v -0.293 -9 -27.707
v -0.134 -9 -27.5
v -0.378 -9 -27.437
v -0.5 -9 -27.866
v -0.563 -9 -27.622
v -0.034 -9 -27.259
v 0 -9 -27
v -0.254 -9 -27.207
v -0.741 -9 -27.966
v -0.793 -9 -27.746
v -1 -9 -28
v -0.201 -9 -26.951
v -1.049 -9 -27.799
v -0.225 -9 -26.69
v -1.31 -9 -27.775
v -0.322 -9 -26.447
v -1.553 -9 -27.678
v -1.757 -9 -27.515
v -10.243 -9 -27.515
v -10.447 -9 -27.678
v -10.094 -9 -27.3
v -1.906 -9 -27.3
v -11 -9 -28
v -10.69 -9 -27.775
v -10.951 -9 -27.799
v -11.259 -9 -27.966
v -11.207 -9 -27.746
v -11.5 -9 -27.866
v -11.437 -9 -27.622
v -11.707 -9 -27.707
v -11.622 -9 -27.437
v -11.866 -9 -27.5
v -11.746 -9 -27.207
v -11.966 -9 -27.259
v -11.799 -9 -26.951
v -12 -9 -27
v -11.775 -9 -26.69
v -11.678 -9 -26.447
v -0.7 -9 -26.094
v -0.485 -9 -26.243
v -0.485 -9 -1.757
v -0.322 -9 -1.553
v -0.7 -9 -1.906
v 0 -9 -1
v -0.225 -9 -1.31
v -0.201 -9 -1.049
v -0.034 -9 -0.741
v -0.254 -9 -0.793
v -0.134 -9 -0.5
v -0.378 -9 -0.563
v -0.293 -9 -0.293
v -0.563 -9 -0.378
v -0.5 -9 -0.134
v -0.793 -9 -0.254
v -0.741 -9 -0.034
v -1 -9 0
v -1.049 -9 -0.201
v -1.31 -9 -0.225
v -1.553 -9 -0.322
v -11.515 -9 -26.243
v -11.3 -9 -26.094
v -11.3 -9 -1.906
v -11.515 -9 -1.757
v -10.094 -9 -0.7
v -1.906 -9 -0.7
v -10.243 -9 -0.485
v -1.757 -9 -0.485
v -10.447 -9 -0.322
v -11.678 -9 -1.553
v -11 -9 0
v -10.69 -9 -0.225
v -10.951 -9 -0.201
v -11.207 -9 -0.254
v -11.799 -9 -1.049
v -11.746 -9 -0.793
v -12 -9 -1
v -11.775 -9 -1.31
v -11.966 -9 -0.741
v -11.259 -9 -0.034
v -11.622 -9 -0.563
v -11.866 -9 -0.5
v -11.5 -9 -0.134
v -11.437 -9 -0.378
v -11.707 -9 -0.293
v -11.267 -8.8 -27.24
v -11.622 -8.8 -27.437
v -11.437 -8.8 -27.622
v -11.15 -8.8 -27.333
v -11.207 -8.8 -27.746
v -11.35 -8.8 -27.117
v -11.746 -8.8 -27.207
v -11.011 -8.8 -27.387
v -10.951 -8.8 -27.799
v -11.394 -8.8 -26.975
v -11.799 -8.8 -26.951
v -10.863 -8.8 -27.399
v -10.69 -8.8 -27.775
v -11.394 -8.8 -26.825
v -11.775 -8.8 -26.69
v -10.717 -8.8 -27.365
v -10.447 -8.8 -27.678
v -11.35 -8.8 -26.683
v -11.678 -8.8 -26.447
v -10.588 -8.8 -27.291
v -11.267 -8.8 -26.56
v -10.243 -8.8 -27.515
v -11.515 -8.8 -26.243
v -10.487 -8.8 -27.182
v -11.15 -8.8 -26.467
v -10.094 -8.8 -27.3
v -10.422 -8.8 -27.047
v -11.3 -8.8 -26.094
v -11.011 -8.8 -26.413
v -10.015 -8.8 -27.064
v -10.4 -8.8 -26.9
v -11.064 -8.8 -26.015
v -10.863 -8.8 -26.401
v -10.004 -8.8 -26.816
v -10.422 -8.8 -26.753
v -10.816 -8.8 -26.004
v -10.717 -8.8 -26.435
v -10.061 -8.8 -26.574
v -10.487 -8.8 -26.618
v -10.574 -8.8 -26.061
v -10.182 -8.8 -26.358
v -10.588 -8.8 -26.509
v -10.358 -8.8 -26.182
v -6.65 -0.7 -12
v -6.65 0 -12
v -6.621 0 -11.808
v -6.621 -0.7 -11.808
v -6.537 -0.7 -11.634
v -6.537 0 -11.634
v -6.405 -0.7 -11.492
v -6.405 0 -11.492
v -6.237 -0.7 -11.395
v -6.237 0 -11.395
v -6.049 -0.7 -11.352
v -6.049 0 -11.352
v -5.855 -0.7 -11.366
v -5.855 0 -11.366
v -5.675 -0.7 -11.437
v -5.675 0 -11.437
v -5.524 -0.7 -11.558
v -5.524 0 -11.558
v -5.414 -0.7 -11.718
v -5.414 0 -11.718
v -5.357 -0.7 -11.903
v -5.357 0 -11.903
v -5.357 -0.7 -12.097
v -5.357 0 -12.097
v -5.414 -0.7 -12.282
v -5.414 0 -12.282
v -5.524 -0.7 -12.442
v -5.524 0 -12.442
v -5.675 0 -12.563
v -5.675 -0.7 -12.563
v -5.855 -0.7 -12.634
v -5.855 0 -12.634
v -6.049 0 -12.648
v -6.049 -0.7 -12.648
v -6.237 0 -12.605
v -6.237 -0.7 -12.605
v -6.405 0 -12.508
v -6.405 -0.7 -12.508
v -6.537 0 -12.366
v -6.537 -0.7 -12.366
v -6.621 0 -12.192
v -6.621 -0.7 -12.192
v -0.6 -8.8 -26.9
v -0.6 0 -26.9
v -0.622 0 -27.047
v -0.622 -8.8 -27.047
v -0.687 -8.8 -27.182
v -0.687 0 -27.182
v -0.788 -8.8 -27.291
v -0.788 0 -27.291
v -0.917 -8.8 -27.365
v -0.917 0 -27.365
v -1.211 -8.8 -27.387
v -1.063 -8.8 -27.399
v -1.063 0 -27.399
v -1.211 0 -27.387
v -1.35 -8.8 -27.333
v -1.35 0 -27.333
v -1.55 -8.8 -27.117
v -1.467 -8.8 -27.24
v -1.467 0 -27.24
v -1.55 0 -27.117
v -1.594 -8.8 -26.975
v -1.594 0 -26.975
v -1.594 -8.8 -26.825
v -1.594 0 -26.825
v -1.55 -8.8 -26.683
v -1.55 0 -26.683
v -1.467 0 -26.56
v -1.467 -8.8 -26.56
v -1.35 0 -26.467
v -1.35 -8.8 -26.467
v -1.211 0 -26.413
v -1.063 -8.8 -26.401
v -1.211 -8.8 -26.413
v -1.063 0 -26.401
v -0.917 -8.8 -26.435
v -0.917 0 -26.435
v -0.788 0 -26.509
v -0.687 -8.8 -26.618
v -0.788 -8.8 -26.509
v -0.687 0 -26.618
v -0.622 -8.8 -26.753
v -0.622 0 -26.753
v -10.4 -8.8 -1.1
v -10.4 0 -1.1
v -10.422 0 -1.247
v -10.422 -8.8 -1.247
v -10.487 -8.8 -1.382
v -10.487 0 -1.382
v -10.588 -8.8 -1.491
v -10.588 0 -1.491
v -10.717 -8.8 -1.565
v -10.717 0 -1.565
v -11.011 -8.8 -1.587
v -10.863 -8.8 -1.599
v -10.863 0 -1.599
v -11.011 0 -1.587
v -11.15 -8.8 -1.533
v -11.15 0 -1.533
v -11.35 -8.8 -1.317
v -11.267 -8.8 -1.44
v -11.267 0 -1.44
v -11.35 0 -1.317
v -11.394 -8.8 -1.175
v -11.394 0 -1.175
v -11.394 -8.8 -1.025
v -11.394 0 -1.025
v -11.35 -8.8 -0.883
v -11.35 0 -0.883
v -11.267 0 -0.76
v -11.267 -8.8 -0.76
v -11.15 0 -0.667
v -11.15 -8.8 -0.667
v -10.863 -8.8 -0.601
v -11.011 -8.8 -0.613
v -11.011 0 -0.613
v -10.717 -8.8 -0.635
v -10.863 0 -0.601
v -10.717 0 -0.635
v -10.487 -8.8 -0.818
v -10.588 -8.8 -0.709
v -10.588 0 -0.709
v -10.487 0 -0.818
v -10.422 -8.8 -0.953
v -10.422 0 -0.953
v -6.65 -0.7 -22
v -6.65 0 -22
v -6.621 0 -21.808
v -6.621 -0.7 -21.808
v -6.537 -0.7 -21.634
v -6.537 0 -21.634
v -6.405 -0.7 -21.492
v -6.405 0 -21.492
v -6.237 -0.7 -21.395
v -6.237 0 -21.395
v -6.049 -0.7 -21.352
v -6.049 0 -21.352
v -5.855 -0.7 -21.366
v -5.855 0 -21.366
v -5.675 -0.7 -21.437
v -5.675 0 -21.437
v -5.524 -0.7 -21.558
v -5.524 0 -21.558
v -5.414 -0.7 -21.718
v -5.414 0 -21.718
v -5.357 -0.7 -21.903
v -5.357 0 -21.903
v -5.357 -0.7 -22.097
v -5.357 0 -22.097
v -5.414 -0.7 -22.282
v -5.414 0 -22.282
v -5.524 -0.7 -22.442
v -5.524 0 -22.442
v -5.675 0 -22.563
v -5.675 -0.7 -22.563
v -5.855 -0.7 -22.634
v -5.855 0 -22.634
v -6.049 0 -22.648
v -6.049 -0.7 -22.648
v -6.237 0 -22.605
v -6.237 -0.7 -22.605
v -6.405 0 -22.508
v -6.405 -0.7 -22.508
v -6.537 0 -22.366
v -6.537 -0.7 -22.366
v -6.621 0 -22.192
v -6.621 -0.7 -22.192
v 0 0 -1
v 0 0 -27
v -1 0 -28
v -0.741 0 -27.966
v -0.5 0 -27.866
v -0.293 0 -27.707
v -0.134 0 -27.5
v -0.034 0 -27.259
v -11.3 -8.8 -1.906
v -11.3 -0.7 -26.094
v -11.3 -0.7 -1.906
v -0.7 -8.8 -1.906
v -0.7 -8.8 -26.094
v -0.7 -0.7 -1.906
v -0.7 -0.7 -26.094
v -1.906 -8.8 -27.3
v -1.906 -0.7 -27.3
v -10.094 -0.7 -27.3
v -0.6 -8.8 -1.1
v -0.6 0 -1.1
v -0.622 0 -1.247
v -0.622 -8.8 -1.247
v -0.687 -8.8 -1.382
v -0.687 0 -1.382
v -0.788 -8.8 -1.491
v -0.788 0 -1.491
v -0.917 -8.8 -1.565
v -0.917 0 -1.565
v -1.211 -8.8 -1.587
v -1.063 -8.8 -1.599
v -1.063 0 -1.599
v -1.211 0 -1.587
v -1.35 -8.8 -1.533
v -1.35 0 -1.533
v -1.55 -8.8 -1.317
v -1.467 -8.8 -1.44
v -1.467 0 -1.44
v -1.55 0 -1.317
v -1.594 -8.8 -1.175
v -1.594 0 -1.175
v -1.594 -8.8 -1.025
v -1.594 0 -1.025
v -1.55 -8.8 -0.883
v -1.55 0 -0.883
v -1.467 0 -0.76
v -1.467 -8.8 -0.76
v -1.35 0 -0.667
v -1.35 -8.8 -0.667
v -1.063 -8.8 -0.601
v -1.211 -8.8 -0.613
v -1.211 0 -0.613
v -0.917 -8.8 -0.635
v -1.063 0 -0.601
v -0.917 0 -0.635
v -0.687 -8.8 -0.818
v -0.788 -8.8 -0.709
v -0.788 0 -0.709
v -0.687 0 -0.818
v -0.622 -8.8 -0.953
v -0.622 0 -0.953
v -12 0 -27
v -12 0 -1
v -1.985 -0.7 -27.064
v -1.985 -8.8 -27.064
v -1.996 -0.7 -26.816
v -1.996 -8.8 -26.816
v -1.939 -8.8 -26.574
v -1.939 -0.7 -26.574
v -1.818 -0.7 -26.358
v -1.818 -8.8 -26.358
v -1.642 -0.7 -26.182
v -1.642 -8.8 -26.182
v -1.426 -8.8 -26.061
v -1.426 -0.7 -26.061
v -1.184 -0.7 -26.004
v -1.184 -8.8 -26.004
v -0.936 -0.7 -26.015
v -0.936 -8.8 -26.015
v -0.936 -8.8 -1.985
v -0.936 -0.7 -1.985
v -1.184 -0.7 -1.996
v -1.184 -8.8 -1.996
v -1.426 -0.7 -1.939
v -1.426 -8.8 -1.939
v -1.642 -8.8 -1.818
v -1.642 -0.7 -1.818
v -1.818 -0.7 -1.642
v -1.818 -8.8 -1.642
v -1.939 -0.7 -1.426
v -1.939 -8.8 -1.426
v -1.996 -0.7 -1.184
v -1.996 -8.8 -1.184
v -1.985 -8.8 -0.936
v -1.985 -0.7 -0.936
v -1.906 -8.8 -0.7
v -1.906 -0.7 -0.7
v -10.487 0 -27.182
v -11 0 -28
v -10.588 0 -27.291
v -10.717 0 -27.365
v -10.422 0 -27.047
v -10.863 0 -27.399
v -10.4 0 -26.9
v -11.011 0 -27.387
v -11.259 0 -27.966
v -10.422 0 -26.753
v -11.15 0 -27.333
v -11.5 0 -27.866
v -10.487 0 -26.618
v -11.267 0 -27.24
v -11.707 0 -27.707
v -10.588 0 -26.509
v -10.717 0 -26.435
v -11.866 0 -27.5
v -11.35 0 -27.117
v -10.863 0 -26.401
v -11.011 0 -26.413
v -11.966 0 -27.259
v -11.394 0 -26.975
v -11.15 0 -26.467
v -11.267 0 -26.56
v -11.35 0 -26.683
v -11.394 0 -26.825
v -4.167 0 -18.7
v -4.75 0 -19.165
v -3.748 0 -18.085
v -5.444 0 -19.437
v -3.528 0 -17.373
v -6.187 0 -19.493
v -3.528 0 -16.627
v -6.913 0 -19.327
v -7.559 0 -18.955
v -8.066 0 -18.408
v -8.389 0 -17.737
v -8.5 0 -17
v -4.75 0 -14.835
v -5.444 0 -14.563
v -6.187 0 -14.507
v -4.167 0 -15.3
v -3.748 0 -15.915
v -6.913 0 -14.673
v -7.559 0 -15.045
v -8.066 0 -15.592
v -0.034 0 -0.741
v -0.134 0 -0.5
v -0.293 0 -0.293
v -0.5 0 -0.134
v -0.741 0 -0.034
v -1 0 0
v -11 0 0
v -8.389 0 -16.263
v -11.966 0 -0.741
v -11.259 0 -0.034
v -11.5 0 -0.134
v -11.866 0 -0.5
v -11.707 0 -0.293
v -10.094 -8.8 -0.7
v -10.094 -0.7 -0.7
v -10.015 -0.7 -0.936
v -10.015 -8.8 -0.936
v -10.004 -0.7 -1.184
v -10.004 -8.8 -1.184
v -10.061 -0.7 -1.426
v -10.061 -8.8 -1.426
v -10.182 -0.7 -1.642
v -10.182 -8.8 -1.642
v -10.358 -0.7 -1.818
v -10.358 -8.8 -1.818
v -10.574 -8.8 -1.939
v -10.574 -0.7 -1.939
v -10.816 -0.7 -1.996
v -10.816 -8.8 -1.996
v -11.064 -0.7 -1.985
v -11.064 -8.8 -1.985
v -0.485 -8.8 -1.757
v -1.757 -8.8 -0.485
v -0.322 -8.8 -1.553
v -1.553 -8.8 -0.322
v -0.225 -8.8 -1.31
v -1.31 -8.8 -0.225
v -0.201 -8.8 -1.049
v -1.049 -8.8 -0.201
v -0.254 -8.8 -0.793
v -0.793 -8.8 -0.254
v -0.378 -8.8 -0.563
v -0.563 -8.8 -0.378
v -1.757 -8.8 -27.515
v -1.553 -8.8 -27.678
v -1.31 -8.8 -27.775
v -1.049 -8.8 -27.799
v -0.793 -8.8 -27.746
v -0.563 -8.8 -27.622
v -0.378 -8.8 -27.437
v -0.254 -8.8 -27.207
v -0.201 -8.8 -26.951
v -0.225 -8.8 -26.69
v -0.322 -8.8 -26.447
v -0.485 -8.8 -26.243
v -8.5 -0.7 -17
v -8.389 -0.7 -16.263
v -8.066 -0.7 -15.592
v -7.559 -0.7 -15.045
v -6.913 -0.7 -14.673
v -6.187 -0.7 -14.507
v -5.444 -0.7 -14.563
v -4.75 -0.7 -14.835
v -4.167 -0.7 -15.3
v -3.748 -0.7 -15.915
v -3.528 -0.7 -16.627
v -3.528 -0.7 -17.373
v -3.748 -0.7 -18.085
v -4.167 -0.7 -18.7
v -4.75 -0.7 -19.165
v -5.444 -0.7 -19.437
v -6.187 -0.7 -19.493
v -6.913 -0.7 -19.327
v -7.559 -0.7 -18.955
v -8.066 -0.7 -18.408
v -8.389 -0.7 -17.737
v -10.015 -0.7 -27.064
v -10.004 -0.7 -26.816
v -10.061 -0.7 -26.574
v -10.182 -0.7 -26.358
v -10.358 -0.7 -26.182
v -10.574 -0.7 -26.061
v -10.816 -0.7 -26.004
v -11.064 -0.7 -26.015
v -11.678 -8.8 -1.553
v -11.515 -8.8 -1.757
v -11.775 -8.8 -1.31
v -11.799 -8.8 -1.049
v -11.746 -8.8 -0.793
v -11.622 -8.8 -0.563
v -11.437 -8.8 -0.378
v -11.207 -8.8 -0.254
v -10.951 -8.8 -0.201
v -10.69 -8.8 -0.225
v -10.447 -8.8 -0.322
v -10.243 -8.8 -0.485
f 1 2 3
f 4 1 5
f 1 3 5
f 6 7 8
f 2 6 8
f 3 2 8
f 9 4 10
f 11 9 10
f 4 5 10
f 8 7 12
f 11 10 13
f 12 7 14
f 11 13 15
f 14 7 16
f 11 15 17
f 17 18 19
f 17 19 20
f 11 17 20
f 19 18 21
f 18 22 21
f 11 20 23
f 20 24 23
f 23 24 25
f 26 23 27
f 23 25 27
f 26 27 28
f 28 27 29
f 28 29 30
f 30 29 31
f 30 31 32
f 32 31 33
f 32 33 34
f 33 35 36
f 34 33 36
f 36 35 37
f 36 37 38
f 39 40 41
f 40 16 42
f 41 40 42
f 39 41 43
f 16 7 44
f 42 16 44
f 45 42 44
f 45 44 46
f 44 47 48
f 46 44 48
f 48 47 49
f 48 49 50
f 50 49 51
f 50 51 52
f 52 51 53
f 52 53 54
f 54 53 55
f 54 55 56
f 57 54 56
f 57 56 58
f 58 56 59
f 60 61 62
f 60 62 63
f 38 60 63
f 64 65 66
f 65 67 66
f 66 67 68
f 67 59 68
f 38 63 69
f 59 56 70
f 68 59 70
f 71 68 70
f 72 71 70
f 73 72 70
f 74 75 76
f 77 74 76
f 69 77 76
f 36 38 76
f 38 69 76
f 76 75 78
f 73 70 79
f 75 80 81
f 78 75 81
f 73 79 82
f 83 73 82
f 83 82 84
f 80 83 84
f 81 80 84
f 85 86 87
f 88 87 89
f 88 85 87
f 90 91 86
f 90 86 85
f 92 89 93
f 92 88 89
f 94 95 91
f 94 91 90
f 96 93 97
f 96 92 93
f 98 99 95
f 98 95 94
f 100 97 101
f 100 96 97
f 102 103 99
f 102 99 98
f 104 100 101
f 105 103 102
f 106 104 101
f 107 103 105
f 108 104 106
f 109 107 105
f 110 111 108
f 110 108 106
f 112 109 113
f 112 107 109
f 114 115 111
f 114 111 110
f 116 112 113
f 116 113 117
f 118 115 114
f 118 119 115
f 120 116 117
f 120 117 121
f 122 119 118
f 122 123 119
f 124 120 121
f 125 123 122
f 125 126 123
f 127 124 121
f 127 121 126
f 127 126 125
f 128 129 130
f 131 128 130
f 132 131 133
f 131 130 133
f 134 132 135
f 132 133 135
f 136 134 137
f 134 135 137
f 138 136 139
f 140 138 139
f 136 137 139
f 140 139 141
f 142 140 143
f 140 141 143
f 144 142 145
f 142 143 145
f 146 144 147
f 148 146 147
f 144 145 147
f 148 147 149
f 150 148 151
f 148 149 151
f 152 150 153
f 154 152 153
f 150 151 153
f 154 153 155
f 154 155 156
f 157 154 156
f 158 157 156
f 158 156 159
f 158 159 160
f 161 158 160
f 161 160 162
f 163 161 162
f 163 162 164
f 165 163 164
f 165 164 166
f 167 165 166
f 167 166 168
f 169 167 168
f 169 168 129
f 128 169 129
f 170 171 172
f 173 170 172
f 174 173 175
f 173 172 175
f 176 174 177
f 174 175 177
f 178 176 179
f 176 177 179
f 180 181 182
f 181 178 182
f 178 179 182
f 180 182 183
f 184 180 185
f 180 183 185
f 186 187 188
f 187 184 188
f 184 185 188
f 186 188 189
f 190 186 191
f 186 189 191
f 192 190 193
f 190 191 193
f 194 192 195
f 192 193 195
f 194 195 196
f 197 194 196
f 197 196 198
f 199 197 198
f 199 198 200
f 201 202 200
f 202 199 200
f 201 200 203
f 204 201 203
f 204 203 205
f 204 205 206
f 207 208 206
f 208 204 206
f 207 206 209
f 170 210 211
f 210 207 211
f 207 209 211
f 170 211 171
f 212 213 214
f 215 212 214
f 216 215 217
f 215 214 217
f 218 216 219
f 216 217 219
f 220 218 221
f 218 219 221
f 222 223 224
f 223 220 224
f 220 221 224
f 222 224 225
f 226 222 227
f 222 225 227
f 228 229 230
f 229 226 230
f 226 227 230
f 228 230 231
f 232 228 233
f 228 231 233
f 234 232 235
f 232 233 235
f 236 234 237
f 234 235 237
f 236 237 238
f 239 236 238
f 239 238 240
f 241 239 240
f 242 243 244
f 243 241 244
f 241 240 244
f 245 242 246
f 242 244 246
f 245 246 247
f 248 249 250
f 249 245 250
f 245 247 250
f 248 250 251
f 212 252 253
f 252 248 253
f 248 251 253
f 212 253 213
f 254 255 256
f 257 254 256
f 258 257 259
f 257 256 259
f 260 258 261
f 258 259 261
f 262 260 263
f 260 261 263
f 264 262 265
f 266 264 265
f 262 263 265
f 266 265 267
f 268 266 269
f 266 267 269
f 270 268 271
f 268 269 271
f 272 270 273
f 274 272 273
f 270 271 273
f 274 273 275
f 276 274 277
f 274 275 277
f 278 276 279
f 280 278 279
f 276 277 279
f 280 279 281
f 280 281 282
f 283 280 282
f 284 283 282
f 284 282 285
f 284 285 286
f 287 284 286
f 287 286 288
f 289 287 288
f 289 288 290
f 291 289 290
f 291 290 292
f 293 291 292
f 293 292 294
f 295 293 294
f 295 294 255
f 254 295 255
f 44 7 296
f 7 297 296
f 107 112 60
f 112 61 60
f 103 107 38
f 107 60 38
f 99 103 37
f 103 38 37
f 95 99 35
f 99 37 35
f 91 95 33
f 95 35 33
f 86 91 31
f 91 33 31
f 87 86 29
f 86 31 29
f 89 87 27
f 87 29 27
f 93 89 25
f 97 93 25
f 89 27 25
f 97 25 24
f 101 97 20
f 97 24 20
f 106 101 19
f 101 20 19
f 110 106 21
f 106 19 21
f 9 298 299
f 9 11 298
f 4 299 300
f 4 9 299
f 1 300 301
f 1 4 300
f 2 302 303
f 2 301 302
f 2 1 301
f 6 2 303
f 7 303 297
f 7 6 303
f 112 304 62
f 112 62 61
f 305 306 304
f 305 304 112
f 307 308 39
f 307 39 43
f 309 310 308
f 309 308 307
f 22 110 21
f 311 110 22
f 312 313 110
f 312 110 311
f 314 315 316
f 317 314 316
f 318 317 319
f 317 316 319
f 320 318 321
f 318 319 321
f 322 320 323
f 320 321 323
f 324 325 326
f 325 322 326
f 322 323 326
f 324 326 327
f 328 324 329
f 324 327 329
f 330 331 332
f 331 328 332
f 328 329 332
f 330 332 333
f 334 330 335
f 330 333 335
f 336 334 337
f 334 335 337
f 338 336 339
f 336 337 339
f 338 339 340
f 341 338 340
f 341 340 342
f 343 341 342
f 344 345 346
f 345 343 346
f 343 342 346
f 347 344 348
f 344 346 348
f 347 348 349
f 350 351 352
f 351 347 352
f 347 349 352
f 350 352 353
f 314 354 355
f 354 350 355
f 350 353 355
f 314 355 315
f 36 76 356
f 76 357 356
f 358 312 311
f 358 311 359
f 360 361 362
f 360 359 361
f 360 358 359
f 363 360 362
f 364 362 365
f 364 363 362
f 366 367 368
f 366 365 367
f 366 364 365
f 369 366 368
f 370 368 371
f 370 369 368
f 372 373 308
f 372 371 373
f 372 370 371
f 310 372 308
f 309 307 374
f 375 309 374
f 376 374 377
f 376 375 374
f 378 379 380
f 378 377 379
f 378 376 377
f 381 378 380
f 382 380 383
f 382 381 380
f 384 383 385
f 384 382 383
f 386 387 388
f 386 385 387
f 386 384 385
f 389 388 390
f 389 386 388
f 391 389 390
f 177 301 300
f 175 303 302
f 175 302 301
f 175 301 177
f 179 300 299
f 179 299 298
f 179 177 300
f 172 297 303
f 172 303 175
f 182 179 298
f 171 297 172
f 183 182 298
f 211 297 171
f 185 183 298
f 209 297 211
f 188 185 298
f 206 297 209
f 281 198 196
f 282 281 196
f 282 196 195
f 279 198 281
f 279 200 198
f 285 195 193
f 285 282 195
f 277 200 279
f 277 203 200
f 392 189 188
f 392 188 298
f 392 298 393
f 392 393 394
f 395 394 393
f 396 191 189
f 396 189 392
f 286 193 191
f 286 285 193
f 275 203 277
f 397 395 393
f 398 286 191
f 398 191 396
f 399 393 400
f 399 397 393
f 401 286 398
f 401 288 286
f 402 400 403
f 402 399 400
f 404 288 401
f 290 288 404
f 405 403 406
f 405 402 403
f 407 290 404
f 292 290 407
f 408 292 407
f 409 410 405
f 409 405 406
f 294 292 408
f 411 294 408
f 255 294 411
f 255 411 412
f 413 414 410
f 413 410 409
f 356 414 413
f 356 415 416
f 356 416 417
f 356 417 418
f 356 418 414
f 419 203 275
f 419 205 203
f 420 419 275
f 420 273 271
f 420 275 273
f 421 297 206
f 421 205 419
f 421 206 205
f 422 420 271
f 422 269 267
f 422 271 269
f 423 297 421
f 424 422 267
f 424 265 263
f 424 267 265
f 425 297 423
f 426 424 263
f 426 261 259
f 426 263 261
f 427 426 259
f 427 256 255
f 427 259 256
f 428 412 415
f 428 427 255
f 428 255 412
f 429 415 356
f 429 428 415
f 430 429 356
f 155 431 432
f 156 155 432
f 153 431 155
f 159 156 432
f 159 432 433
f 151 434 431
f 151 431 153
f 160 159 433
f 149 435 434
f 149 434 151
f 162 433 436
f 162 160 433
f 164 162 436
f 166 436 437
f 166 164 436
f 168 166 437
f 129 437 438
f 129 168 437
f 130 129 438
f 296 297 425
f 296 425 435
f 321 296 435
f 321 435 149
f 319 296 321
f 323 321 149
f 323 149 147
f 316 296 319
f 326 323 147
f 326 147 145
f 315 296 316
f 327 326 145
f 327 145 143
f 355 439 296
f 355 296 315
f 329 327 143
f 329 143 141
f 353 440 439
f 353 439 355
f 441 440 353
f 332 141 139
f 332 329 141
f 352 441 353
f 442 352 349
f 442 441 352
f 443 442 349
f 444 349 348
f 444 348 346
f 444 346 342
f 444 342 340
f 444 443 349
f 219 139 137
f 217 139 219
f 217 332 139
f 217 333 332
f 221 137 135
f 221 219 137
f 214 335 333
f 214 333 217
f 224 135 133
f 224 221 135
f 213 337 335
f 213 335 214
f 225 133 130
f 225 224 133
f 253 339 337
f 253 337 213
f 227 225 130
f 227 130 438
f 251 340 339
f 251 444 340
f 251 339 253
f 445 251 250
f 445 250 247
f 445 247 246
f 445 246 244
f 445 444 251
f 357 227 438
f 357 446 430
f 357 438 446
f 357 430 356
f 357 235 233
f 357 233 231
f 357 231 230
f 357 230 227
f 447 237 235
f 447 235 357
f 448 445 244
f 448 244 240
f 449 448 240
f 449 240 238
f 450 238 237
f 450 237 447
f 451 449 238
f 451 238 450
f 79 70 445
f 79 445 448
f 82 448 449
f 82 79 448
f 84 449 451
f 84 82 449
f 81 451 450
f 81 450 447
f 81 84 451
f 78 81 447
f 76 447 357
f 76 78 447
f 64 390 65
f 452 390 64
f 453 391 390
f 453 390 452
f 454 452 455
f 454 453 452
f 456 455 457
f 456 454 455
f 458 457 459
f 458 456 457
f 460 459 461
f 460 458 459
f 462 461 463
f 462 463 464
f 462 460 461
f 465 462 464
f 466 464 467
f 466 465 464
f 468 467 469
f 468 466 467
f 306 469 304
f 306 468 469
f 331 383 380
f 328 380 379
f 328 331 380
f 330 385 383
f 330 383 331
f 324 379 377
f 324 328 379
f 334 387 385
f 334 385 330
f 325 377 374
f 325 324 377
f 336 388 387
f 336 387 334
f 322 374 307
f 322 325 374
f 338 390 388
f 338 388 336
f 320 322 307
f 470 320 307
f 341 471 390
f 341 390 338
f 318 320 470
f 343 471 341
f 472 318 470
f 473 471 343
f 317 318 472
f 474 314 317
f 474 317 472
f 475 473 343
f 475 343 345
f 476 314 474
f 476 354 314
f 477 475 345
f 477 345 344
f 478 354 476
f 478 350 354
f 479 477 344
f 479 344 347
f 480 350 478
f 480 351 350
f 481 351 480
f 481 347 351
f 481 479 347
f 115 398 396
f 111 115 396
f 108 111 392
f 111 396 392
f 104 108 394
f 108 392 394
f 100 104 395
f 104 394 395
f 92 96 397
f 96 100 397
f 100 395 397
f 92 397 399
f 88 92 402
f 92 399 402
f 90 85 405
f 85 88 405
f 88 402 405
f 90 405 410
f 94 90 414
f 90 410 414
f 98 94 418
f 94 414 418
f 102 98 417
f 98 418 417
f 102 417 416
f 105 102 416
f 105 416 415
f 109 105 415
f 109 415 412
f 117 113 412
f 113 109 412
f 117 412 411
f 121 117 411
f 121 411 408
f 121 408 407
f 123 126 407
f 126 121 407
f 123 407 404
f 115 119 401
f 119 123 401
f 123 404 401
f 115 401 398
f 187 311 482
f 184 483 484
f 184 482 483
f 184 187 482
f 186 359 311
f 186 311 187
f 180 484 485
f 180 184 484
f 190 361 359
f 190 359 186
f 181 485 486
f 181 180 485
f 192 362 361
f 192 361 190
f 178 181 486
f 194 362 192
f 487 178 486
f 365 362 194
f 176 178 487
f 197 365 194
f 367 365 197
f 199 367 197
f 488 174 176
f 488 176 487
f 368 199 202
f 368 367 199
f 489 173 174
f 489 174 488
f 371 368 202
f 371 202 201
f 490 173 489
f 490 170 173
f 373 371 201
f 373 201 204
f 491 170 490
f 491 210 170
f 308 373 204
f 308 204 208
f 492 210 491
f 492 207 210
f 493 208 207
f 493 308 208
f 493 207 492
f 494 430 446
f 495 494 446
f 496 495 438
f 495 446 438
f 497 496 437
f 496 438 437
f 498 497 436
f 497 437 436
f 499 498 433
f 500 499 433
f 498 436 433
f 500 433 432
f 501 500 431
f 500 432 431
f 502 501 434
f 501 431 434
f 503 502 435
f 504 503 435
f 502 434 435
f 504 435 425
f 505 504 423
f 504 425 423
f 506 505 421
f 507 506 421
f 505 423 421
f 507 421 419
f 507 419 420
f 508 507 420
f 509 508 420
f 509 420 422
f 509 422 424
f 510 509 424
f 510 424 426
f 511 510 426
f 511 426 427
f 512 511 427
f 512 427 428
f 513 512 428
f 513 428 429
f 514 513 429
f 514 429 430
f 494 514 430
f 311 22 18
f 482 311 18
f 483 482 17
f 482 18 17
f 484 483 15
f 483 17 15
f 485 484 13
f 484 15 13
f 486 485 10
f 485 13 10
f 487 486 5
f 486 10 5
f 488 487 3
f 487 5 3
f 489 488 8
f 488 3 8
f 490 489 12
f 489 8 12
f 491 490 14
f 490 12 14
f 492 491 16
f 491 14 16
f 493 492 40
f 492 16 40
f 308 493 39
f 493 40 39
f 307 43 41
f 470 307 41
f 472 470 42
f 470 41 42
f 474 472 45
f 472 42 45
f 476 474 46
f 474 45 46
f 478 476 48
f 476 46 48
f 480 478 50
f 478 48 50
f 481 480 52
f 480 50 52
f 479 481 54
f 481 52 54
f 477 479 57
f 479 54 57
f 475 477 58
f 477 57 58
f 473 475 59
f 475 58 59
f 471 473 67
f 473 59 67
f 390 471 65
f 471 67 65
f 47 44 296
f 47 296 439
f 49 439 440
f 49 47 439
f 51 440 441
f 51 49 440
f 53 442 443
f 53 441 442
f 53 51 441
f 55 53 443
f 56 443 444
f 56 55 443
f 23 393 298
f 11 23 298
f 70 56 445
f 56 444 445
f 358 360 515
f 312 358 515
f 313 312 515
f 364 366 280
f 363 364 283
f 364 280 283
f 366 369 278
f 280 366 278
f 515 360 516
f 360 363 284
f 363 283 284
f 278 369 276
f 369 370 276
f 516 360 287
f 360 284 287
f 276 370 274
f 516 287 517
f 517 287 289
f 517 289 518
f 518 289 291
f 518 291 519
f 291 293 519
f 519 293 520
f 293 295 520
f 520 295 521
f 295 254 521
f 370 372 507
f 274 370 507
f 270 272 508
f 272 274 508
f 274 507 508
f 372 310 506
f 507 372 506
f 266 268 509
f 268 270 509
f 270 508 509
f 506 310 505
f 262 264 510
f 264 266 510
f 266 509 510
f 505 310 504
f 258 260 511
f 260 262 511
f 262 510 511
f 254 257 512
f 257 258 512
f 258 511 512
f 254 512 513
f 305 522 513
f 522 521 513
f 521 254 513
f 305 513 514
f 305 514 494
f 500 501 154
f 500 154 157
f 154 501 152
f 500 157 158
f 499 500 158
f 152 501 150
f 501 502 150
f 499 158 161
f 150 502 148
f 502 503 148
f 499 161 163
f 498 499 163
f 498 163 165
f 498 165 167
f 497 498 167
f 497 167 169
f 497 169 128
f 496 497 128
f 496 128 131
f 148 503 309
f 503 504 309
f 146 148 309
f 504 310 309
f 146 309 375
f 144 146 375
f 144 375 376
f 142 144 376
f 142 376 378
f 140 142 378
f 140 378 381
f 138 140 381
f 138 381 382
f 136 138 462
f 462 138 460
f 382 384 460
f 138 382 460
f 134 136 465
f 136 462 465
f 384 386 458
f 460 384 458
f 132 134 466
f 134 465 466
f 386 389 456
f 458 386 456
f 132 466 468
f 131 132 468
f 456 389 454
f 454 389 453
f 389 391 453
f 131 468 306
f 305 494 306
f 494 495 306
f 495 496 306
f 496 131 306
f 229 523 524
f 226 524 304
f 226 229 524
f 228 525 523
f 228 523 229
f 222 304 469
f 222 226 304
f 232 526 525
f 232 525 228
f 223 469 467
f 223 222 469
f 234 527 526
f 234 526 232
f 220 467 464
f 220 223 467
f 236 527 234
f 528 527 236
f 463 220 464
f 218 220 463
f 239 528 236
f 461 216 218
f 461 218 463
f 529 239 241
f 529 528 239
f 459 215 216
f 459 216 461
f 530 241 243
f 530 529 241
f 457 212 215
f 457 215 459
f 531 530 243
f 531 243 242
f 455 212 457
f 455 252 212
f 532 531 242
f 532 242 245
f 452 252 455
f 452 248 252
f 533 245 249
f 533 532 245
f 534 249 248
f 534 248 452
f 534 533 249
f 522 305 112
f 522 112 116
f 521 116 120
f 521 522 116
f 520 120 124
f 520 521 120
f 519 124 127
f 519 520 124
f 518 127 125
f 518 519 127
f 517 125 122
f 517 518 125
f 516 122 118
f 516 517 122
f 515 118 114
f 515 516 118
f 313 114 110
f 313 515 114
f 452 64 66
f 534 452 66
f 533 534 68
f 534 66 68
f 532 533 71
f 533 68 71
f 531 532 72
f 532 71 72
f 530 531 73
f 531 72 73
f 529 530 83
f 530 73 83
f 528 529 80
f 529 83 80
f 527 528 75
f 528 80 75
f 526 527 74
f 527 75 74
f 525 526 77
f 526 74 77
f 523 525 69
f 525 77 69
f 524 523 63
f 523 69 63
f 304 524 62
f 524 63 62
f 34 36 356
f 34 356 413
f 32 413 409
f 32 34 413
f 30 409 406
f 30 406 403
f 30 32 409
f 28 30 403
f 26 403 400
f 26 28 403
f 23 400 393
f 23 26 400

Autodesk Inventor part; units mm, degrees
ref_plane "YZ Plane" through (0, 0, 0) normal (1, 0, 0) x (0, 1, 0)
ref_plane "XZ Plane" through (0, 0, 0) normal (0, 1, 0) x (-1, 0, 0)
ref_plane "XY Plane" through (0, 0, 0) normal (0, 0, 1) x (1, 0, 0)
sketch "Эскиз1" plane through (0, 0, 0) normal (0, 1, 0) x (-1, 0, 0)
  line L0 (0, 0) -> (12, 0)
  line L1 (12, 0) -> (12, -28)
  line L2 (12, -28) -> (0, -28)
  line L3 (0, -28) -> (0, 0)
  circle A0 centre (6, -12) radius 0.65
  circle A1 centre (6, -17) radius 2.5
  circle A2 centre (6, -22) radius 0.65
  line L4 (6, -12) -> (6, -17) construction
  line L5 (6, -17) -> (6, -22) construction
  line L6 (6, -6) -> (6, 0) construction
  line L7 (6, -12) -> (12, -12) construction
  circle A3 centre (6, -12) radius 1.15
  circle A4 centre (6, -22) radius 1.15
  line L8 (6, -22) -> (6, -28) construction
  line L9 (6, -12) -> (6, -6) construction
  point P0 (12, -14)
  dimension "d0" = 5
  dimension "d1" = 6
  dimension "d2" = 5
  dimension "d7" = 0.5
  dimension "d8" = 1.3
  dimension "d20" = 6
extrude "Выдавливание1" add sketch "Эскиз1" against normal blind 9 contours L0 L1 L2 L3 | A0 | A1 | A2 | A3 | A4
shell "Оболочка1" thickness 0.7 removed faces 1 at (-4, -9, -9.3333)
extrude "Выдавливание2" cut sketch "Эскиз1" against normal through all contours A0 | A1 | A2
sketch "Эскиз2" plane through (0, -9, 0) normal (0, -1, 0) x (1, 0, 0)
  line L0 (0, -28) -> (-12, -28) construction
  line L1 (-6, -28) -> (-6, 0) construction
  line L2 (-12, 0) -> (0, 0) construction
  line L3 (-12, -28) -> (-12, 0) construction
  line L4 (-12, -14) -> (0, -14) construction
  line L5 (0, 0) -> (0, -28) construction
  circle A0 centre (-1.1, -26.9) radius 0.9
  circle A1 centre (-1.1, -26.9) radius 0.5
  circle A2 centre (-10.9, -26.9) radius 0.9
  circle A3 centre (-10.9, -26.9) radius 0.5
  circle A4 centre (-1.1, -1.1) radius 0.9
  circle A5 centre (-1.1, -1.1) radius 0.5
  circle A6 centre (-10.9, -1.1) radius 0.5
  circle A7 centre (-10.9, -1.1) radius 0.9
  dimension "d11" = 1.1
  dimension "d12" = 1.1
  dimension "d13" = 1
  dimension "d14" = 0.4
extrude "Выдавливание3" cut sketch "Эскиз2" against normal through all contours A0 | A1 | A2 | A3 | A4 | A5 | A6 | A7
extrude "Выдавливание4" add sketch "Эскиз2" along normal blind 8.8 from surface at -9
fillet "Сопряжение1" radius 1 4 edges at (-12, -4.5, -28) (0, -4.5, -28) (0, -4.5, 0) (-12, -4.5, 0)
equation "\"d11\" = d12"
properties part number "Голова сервы"
